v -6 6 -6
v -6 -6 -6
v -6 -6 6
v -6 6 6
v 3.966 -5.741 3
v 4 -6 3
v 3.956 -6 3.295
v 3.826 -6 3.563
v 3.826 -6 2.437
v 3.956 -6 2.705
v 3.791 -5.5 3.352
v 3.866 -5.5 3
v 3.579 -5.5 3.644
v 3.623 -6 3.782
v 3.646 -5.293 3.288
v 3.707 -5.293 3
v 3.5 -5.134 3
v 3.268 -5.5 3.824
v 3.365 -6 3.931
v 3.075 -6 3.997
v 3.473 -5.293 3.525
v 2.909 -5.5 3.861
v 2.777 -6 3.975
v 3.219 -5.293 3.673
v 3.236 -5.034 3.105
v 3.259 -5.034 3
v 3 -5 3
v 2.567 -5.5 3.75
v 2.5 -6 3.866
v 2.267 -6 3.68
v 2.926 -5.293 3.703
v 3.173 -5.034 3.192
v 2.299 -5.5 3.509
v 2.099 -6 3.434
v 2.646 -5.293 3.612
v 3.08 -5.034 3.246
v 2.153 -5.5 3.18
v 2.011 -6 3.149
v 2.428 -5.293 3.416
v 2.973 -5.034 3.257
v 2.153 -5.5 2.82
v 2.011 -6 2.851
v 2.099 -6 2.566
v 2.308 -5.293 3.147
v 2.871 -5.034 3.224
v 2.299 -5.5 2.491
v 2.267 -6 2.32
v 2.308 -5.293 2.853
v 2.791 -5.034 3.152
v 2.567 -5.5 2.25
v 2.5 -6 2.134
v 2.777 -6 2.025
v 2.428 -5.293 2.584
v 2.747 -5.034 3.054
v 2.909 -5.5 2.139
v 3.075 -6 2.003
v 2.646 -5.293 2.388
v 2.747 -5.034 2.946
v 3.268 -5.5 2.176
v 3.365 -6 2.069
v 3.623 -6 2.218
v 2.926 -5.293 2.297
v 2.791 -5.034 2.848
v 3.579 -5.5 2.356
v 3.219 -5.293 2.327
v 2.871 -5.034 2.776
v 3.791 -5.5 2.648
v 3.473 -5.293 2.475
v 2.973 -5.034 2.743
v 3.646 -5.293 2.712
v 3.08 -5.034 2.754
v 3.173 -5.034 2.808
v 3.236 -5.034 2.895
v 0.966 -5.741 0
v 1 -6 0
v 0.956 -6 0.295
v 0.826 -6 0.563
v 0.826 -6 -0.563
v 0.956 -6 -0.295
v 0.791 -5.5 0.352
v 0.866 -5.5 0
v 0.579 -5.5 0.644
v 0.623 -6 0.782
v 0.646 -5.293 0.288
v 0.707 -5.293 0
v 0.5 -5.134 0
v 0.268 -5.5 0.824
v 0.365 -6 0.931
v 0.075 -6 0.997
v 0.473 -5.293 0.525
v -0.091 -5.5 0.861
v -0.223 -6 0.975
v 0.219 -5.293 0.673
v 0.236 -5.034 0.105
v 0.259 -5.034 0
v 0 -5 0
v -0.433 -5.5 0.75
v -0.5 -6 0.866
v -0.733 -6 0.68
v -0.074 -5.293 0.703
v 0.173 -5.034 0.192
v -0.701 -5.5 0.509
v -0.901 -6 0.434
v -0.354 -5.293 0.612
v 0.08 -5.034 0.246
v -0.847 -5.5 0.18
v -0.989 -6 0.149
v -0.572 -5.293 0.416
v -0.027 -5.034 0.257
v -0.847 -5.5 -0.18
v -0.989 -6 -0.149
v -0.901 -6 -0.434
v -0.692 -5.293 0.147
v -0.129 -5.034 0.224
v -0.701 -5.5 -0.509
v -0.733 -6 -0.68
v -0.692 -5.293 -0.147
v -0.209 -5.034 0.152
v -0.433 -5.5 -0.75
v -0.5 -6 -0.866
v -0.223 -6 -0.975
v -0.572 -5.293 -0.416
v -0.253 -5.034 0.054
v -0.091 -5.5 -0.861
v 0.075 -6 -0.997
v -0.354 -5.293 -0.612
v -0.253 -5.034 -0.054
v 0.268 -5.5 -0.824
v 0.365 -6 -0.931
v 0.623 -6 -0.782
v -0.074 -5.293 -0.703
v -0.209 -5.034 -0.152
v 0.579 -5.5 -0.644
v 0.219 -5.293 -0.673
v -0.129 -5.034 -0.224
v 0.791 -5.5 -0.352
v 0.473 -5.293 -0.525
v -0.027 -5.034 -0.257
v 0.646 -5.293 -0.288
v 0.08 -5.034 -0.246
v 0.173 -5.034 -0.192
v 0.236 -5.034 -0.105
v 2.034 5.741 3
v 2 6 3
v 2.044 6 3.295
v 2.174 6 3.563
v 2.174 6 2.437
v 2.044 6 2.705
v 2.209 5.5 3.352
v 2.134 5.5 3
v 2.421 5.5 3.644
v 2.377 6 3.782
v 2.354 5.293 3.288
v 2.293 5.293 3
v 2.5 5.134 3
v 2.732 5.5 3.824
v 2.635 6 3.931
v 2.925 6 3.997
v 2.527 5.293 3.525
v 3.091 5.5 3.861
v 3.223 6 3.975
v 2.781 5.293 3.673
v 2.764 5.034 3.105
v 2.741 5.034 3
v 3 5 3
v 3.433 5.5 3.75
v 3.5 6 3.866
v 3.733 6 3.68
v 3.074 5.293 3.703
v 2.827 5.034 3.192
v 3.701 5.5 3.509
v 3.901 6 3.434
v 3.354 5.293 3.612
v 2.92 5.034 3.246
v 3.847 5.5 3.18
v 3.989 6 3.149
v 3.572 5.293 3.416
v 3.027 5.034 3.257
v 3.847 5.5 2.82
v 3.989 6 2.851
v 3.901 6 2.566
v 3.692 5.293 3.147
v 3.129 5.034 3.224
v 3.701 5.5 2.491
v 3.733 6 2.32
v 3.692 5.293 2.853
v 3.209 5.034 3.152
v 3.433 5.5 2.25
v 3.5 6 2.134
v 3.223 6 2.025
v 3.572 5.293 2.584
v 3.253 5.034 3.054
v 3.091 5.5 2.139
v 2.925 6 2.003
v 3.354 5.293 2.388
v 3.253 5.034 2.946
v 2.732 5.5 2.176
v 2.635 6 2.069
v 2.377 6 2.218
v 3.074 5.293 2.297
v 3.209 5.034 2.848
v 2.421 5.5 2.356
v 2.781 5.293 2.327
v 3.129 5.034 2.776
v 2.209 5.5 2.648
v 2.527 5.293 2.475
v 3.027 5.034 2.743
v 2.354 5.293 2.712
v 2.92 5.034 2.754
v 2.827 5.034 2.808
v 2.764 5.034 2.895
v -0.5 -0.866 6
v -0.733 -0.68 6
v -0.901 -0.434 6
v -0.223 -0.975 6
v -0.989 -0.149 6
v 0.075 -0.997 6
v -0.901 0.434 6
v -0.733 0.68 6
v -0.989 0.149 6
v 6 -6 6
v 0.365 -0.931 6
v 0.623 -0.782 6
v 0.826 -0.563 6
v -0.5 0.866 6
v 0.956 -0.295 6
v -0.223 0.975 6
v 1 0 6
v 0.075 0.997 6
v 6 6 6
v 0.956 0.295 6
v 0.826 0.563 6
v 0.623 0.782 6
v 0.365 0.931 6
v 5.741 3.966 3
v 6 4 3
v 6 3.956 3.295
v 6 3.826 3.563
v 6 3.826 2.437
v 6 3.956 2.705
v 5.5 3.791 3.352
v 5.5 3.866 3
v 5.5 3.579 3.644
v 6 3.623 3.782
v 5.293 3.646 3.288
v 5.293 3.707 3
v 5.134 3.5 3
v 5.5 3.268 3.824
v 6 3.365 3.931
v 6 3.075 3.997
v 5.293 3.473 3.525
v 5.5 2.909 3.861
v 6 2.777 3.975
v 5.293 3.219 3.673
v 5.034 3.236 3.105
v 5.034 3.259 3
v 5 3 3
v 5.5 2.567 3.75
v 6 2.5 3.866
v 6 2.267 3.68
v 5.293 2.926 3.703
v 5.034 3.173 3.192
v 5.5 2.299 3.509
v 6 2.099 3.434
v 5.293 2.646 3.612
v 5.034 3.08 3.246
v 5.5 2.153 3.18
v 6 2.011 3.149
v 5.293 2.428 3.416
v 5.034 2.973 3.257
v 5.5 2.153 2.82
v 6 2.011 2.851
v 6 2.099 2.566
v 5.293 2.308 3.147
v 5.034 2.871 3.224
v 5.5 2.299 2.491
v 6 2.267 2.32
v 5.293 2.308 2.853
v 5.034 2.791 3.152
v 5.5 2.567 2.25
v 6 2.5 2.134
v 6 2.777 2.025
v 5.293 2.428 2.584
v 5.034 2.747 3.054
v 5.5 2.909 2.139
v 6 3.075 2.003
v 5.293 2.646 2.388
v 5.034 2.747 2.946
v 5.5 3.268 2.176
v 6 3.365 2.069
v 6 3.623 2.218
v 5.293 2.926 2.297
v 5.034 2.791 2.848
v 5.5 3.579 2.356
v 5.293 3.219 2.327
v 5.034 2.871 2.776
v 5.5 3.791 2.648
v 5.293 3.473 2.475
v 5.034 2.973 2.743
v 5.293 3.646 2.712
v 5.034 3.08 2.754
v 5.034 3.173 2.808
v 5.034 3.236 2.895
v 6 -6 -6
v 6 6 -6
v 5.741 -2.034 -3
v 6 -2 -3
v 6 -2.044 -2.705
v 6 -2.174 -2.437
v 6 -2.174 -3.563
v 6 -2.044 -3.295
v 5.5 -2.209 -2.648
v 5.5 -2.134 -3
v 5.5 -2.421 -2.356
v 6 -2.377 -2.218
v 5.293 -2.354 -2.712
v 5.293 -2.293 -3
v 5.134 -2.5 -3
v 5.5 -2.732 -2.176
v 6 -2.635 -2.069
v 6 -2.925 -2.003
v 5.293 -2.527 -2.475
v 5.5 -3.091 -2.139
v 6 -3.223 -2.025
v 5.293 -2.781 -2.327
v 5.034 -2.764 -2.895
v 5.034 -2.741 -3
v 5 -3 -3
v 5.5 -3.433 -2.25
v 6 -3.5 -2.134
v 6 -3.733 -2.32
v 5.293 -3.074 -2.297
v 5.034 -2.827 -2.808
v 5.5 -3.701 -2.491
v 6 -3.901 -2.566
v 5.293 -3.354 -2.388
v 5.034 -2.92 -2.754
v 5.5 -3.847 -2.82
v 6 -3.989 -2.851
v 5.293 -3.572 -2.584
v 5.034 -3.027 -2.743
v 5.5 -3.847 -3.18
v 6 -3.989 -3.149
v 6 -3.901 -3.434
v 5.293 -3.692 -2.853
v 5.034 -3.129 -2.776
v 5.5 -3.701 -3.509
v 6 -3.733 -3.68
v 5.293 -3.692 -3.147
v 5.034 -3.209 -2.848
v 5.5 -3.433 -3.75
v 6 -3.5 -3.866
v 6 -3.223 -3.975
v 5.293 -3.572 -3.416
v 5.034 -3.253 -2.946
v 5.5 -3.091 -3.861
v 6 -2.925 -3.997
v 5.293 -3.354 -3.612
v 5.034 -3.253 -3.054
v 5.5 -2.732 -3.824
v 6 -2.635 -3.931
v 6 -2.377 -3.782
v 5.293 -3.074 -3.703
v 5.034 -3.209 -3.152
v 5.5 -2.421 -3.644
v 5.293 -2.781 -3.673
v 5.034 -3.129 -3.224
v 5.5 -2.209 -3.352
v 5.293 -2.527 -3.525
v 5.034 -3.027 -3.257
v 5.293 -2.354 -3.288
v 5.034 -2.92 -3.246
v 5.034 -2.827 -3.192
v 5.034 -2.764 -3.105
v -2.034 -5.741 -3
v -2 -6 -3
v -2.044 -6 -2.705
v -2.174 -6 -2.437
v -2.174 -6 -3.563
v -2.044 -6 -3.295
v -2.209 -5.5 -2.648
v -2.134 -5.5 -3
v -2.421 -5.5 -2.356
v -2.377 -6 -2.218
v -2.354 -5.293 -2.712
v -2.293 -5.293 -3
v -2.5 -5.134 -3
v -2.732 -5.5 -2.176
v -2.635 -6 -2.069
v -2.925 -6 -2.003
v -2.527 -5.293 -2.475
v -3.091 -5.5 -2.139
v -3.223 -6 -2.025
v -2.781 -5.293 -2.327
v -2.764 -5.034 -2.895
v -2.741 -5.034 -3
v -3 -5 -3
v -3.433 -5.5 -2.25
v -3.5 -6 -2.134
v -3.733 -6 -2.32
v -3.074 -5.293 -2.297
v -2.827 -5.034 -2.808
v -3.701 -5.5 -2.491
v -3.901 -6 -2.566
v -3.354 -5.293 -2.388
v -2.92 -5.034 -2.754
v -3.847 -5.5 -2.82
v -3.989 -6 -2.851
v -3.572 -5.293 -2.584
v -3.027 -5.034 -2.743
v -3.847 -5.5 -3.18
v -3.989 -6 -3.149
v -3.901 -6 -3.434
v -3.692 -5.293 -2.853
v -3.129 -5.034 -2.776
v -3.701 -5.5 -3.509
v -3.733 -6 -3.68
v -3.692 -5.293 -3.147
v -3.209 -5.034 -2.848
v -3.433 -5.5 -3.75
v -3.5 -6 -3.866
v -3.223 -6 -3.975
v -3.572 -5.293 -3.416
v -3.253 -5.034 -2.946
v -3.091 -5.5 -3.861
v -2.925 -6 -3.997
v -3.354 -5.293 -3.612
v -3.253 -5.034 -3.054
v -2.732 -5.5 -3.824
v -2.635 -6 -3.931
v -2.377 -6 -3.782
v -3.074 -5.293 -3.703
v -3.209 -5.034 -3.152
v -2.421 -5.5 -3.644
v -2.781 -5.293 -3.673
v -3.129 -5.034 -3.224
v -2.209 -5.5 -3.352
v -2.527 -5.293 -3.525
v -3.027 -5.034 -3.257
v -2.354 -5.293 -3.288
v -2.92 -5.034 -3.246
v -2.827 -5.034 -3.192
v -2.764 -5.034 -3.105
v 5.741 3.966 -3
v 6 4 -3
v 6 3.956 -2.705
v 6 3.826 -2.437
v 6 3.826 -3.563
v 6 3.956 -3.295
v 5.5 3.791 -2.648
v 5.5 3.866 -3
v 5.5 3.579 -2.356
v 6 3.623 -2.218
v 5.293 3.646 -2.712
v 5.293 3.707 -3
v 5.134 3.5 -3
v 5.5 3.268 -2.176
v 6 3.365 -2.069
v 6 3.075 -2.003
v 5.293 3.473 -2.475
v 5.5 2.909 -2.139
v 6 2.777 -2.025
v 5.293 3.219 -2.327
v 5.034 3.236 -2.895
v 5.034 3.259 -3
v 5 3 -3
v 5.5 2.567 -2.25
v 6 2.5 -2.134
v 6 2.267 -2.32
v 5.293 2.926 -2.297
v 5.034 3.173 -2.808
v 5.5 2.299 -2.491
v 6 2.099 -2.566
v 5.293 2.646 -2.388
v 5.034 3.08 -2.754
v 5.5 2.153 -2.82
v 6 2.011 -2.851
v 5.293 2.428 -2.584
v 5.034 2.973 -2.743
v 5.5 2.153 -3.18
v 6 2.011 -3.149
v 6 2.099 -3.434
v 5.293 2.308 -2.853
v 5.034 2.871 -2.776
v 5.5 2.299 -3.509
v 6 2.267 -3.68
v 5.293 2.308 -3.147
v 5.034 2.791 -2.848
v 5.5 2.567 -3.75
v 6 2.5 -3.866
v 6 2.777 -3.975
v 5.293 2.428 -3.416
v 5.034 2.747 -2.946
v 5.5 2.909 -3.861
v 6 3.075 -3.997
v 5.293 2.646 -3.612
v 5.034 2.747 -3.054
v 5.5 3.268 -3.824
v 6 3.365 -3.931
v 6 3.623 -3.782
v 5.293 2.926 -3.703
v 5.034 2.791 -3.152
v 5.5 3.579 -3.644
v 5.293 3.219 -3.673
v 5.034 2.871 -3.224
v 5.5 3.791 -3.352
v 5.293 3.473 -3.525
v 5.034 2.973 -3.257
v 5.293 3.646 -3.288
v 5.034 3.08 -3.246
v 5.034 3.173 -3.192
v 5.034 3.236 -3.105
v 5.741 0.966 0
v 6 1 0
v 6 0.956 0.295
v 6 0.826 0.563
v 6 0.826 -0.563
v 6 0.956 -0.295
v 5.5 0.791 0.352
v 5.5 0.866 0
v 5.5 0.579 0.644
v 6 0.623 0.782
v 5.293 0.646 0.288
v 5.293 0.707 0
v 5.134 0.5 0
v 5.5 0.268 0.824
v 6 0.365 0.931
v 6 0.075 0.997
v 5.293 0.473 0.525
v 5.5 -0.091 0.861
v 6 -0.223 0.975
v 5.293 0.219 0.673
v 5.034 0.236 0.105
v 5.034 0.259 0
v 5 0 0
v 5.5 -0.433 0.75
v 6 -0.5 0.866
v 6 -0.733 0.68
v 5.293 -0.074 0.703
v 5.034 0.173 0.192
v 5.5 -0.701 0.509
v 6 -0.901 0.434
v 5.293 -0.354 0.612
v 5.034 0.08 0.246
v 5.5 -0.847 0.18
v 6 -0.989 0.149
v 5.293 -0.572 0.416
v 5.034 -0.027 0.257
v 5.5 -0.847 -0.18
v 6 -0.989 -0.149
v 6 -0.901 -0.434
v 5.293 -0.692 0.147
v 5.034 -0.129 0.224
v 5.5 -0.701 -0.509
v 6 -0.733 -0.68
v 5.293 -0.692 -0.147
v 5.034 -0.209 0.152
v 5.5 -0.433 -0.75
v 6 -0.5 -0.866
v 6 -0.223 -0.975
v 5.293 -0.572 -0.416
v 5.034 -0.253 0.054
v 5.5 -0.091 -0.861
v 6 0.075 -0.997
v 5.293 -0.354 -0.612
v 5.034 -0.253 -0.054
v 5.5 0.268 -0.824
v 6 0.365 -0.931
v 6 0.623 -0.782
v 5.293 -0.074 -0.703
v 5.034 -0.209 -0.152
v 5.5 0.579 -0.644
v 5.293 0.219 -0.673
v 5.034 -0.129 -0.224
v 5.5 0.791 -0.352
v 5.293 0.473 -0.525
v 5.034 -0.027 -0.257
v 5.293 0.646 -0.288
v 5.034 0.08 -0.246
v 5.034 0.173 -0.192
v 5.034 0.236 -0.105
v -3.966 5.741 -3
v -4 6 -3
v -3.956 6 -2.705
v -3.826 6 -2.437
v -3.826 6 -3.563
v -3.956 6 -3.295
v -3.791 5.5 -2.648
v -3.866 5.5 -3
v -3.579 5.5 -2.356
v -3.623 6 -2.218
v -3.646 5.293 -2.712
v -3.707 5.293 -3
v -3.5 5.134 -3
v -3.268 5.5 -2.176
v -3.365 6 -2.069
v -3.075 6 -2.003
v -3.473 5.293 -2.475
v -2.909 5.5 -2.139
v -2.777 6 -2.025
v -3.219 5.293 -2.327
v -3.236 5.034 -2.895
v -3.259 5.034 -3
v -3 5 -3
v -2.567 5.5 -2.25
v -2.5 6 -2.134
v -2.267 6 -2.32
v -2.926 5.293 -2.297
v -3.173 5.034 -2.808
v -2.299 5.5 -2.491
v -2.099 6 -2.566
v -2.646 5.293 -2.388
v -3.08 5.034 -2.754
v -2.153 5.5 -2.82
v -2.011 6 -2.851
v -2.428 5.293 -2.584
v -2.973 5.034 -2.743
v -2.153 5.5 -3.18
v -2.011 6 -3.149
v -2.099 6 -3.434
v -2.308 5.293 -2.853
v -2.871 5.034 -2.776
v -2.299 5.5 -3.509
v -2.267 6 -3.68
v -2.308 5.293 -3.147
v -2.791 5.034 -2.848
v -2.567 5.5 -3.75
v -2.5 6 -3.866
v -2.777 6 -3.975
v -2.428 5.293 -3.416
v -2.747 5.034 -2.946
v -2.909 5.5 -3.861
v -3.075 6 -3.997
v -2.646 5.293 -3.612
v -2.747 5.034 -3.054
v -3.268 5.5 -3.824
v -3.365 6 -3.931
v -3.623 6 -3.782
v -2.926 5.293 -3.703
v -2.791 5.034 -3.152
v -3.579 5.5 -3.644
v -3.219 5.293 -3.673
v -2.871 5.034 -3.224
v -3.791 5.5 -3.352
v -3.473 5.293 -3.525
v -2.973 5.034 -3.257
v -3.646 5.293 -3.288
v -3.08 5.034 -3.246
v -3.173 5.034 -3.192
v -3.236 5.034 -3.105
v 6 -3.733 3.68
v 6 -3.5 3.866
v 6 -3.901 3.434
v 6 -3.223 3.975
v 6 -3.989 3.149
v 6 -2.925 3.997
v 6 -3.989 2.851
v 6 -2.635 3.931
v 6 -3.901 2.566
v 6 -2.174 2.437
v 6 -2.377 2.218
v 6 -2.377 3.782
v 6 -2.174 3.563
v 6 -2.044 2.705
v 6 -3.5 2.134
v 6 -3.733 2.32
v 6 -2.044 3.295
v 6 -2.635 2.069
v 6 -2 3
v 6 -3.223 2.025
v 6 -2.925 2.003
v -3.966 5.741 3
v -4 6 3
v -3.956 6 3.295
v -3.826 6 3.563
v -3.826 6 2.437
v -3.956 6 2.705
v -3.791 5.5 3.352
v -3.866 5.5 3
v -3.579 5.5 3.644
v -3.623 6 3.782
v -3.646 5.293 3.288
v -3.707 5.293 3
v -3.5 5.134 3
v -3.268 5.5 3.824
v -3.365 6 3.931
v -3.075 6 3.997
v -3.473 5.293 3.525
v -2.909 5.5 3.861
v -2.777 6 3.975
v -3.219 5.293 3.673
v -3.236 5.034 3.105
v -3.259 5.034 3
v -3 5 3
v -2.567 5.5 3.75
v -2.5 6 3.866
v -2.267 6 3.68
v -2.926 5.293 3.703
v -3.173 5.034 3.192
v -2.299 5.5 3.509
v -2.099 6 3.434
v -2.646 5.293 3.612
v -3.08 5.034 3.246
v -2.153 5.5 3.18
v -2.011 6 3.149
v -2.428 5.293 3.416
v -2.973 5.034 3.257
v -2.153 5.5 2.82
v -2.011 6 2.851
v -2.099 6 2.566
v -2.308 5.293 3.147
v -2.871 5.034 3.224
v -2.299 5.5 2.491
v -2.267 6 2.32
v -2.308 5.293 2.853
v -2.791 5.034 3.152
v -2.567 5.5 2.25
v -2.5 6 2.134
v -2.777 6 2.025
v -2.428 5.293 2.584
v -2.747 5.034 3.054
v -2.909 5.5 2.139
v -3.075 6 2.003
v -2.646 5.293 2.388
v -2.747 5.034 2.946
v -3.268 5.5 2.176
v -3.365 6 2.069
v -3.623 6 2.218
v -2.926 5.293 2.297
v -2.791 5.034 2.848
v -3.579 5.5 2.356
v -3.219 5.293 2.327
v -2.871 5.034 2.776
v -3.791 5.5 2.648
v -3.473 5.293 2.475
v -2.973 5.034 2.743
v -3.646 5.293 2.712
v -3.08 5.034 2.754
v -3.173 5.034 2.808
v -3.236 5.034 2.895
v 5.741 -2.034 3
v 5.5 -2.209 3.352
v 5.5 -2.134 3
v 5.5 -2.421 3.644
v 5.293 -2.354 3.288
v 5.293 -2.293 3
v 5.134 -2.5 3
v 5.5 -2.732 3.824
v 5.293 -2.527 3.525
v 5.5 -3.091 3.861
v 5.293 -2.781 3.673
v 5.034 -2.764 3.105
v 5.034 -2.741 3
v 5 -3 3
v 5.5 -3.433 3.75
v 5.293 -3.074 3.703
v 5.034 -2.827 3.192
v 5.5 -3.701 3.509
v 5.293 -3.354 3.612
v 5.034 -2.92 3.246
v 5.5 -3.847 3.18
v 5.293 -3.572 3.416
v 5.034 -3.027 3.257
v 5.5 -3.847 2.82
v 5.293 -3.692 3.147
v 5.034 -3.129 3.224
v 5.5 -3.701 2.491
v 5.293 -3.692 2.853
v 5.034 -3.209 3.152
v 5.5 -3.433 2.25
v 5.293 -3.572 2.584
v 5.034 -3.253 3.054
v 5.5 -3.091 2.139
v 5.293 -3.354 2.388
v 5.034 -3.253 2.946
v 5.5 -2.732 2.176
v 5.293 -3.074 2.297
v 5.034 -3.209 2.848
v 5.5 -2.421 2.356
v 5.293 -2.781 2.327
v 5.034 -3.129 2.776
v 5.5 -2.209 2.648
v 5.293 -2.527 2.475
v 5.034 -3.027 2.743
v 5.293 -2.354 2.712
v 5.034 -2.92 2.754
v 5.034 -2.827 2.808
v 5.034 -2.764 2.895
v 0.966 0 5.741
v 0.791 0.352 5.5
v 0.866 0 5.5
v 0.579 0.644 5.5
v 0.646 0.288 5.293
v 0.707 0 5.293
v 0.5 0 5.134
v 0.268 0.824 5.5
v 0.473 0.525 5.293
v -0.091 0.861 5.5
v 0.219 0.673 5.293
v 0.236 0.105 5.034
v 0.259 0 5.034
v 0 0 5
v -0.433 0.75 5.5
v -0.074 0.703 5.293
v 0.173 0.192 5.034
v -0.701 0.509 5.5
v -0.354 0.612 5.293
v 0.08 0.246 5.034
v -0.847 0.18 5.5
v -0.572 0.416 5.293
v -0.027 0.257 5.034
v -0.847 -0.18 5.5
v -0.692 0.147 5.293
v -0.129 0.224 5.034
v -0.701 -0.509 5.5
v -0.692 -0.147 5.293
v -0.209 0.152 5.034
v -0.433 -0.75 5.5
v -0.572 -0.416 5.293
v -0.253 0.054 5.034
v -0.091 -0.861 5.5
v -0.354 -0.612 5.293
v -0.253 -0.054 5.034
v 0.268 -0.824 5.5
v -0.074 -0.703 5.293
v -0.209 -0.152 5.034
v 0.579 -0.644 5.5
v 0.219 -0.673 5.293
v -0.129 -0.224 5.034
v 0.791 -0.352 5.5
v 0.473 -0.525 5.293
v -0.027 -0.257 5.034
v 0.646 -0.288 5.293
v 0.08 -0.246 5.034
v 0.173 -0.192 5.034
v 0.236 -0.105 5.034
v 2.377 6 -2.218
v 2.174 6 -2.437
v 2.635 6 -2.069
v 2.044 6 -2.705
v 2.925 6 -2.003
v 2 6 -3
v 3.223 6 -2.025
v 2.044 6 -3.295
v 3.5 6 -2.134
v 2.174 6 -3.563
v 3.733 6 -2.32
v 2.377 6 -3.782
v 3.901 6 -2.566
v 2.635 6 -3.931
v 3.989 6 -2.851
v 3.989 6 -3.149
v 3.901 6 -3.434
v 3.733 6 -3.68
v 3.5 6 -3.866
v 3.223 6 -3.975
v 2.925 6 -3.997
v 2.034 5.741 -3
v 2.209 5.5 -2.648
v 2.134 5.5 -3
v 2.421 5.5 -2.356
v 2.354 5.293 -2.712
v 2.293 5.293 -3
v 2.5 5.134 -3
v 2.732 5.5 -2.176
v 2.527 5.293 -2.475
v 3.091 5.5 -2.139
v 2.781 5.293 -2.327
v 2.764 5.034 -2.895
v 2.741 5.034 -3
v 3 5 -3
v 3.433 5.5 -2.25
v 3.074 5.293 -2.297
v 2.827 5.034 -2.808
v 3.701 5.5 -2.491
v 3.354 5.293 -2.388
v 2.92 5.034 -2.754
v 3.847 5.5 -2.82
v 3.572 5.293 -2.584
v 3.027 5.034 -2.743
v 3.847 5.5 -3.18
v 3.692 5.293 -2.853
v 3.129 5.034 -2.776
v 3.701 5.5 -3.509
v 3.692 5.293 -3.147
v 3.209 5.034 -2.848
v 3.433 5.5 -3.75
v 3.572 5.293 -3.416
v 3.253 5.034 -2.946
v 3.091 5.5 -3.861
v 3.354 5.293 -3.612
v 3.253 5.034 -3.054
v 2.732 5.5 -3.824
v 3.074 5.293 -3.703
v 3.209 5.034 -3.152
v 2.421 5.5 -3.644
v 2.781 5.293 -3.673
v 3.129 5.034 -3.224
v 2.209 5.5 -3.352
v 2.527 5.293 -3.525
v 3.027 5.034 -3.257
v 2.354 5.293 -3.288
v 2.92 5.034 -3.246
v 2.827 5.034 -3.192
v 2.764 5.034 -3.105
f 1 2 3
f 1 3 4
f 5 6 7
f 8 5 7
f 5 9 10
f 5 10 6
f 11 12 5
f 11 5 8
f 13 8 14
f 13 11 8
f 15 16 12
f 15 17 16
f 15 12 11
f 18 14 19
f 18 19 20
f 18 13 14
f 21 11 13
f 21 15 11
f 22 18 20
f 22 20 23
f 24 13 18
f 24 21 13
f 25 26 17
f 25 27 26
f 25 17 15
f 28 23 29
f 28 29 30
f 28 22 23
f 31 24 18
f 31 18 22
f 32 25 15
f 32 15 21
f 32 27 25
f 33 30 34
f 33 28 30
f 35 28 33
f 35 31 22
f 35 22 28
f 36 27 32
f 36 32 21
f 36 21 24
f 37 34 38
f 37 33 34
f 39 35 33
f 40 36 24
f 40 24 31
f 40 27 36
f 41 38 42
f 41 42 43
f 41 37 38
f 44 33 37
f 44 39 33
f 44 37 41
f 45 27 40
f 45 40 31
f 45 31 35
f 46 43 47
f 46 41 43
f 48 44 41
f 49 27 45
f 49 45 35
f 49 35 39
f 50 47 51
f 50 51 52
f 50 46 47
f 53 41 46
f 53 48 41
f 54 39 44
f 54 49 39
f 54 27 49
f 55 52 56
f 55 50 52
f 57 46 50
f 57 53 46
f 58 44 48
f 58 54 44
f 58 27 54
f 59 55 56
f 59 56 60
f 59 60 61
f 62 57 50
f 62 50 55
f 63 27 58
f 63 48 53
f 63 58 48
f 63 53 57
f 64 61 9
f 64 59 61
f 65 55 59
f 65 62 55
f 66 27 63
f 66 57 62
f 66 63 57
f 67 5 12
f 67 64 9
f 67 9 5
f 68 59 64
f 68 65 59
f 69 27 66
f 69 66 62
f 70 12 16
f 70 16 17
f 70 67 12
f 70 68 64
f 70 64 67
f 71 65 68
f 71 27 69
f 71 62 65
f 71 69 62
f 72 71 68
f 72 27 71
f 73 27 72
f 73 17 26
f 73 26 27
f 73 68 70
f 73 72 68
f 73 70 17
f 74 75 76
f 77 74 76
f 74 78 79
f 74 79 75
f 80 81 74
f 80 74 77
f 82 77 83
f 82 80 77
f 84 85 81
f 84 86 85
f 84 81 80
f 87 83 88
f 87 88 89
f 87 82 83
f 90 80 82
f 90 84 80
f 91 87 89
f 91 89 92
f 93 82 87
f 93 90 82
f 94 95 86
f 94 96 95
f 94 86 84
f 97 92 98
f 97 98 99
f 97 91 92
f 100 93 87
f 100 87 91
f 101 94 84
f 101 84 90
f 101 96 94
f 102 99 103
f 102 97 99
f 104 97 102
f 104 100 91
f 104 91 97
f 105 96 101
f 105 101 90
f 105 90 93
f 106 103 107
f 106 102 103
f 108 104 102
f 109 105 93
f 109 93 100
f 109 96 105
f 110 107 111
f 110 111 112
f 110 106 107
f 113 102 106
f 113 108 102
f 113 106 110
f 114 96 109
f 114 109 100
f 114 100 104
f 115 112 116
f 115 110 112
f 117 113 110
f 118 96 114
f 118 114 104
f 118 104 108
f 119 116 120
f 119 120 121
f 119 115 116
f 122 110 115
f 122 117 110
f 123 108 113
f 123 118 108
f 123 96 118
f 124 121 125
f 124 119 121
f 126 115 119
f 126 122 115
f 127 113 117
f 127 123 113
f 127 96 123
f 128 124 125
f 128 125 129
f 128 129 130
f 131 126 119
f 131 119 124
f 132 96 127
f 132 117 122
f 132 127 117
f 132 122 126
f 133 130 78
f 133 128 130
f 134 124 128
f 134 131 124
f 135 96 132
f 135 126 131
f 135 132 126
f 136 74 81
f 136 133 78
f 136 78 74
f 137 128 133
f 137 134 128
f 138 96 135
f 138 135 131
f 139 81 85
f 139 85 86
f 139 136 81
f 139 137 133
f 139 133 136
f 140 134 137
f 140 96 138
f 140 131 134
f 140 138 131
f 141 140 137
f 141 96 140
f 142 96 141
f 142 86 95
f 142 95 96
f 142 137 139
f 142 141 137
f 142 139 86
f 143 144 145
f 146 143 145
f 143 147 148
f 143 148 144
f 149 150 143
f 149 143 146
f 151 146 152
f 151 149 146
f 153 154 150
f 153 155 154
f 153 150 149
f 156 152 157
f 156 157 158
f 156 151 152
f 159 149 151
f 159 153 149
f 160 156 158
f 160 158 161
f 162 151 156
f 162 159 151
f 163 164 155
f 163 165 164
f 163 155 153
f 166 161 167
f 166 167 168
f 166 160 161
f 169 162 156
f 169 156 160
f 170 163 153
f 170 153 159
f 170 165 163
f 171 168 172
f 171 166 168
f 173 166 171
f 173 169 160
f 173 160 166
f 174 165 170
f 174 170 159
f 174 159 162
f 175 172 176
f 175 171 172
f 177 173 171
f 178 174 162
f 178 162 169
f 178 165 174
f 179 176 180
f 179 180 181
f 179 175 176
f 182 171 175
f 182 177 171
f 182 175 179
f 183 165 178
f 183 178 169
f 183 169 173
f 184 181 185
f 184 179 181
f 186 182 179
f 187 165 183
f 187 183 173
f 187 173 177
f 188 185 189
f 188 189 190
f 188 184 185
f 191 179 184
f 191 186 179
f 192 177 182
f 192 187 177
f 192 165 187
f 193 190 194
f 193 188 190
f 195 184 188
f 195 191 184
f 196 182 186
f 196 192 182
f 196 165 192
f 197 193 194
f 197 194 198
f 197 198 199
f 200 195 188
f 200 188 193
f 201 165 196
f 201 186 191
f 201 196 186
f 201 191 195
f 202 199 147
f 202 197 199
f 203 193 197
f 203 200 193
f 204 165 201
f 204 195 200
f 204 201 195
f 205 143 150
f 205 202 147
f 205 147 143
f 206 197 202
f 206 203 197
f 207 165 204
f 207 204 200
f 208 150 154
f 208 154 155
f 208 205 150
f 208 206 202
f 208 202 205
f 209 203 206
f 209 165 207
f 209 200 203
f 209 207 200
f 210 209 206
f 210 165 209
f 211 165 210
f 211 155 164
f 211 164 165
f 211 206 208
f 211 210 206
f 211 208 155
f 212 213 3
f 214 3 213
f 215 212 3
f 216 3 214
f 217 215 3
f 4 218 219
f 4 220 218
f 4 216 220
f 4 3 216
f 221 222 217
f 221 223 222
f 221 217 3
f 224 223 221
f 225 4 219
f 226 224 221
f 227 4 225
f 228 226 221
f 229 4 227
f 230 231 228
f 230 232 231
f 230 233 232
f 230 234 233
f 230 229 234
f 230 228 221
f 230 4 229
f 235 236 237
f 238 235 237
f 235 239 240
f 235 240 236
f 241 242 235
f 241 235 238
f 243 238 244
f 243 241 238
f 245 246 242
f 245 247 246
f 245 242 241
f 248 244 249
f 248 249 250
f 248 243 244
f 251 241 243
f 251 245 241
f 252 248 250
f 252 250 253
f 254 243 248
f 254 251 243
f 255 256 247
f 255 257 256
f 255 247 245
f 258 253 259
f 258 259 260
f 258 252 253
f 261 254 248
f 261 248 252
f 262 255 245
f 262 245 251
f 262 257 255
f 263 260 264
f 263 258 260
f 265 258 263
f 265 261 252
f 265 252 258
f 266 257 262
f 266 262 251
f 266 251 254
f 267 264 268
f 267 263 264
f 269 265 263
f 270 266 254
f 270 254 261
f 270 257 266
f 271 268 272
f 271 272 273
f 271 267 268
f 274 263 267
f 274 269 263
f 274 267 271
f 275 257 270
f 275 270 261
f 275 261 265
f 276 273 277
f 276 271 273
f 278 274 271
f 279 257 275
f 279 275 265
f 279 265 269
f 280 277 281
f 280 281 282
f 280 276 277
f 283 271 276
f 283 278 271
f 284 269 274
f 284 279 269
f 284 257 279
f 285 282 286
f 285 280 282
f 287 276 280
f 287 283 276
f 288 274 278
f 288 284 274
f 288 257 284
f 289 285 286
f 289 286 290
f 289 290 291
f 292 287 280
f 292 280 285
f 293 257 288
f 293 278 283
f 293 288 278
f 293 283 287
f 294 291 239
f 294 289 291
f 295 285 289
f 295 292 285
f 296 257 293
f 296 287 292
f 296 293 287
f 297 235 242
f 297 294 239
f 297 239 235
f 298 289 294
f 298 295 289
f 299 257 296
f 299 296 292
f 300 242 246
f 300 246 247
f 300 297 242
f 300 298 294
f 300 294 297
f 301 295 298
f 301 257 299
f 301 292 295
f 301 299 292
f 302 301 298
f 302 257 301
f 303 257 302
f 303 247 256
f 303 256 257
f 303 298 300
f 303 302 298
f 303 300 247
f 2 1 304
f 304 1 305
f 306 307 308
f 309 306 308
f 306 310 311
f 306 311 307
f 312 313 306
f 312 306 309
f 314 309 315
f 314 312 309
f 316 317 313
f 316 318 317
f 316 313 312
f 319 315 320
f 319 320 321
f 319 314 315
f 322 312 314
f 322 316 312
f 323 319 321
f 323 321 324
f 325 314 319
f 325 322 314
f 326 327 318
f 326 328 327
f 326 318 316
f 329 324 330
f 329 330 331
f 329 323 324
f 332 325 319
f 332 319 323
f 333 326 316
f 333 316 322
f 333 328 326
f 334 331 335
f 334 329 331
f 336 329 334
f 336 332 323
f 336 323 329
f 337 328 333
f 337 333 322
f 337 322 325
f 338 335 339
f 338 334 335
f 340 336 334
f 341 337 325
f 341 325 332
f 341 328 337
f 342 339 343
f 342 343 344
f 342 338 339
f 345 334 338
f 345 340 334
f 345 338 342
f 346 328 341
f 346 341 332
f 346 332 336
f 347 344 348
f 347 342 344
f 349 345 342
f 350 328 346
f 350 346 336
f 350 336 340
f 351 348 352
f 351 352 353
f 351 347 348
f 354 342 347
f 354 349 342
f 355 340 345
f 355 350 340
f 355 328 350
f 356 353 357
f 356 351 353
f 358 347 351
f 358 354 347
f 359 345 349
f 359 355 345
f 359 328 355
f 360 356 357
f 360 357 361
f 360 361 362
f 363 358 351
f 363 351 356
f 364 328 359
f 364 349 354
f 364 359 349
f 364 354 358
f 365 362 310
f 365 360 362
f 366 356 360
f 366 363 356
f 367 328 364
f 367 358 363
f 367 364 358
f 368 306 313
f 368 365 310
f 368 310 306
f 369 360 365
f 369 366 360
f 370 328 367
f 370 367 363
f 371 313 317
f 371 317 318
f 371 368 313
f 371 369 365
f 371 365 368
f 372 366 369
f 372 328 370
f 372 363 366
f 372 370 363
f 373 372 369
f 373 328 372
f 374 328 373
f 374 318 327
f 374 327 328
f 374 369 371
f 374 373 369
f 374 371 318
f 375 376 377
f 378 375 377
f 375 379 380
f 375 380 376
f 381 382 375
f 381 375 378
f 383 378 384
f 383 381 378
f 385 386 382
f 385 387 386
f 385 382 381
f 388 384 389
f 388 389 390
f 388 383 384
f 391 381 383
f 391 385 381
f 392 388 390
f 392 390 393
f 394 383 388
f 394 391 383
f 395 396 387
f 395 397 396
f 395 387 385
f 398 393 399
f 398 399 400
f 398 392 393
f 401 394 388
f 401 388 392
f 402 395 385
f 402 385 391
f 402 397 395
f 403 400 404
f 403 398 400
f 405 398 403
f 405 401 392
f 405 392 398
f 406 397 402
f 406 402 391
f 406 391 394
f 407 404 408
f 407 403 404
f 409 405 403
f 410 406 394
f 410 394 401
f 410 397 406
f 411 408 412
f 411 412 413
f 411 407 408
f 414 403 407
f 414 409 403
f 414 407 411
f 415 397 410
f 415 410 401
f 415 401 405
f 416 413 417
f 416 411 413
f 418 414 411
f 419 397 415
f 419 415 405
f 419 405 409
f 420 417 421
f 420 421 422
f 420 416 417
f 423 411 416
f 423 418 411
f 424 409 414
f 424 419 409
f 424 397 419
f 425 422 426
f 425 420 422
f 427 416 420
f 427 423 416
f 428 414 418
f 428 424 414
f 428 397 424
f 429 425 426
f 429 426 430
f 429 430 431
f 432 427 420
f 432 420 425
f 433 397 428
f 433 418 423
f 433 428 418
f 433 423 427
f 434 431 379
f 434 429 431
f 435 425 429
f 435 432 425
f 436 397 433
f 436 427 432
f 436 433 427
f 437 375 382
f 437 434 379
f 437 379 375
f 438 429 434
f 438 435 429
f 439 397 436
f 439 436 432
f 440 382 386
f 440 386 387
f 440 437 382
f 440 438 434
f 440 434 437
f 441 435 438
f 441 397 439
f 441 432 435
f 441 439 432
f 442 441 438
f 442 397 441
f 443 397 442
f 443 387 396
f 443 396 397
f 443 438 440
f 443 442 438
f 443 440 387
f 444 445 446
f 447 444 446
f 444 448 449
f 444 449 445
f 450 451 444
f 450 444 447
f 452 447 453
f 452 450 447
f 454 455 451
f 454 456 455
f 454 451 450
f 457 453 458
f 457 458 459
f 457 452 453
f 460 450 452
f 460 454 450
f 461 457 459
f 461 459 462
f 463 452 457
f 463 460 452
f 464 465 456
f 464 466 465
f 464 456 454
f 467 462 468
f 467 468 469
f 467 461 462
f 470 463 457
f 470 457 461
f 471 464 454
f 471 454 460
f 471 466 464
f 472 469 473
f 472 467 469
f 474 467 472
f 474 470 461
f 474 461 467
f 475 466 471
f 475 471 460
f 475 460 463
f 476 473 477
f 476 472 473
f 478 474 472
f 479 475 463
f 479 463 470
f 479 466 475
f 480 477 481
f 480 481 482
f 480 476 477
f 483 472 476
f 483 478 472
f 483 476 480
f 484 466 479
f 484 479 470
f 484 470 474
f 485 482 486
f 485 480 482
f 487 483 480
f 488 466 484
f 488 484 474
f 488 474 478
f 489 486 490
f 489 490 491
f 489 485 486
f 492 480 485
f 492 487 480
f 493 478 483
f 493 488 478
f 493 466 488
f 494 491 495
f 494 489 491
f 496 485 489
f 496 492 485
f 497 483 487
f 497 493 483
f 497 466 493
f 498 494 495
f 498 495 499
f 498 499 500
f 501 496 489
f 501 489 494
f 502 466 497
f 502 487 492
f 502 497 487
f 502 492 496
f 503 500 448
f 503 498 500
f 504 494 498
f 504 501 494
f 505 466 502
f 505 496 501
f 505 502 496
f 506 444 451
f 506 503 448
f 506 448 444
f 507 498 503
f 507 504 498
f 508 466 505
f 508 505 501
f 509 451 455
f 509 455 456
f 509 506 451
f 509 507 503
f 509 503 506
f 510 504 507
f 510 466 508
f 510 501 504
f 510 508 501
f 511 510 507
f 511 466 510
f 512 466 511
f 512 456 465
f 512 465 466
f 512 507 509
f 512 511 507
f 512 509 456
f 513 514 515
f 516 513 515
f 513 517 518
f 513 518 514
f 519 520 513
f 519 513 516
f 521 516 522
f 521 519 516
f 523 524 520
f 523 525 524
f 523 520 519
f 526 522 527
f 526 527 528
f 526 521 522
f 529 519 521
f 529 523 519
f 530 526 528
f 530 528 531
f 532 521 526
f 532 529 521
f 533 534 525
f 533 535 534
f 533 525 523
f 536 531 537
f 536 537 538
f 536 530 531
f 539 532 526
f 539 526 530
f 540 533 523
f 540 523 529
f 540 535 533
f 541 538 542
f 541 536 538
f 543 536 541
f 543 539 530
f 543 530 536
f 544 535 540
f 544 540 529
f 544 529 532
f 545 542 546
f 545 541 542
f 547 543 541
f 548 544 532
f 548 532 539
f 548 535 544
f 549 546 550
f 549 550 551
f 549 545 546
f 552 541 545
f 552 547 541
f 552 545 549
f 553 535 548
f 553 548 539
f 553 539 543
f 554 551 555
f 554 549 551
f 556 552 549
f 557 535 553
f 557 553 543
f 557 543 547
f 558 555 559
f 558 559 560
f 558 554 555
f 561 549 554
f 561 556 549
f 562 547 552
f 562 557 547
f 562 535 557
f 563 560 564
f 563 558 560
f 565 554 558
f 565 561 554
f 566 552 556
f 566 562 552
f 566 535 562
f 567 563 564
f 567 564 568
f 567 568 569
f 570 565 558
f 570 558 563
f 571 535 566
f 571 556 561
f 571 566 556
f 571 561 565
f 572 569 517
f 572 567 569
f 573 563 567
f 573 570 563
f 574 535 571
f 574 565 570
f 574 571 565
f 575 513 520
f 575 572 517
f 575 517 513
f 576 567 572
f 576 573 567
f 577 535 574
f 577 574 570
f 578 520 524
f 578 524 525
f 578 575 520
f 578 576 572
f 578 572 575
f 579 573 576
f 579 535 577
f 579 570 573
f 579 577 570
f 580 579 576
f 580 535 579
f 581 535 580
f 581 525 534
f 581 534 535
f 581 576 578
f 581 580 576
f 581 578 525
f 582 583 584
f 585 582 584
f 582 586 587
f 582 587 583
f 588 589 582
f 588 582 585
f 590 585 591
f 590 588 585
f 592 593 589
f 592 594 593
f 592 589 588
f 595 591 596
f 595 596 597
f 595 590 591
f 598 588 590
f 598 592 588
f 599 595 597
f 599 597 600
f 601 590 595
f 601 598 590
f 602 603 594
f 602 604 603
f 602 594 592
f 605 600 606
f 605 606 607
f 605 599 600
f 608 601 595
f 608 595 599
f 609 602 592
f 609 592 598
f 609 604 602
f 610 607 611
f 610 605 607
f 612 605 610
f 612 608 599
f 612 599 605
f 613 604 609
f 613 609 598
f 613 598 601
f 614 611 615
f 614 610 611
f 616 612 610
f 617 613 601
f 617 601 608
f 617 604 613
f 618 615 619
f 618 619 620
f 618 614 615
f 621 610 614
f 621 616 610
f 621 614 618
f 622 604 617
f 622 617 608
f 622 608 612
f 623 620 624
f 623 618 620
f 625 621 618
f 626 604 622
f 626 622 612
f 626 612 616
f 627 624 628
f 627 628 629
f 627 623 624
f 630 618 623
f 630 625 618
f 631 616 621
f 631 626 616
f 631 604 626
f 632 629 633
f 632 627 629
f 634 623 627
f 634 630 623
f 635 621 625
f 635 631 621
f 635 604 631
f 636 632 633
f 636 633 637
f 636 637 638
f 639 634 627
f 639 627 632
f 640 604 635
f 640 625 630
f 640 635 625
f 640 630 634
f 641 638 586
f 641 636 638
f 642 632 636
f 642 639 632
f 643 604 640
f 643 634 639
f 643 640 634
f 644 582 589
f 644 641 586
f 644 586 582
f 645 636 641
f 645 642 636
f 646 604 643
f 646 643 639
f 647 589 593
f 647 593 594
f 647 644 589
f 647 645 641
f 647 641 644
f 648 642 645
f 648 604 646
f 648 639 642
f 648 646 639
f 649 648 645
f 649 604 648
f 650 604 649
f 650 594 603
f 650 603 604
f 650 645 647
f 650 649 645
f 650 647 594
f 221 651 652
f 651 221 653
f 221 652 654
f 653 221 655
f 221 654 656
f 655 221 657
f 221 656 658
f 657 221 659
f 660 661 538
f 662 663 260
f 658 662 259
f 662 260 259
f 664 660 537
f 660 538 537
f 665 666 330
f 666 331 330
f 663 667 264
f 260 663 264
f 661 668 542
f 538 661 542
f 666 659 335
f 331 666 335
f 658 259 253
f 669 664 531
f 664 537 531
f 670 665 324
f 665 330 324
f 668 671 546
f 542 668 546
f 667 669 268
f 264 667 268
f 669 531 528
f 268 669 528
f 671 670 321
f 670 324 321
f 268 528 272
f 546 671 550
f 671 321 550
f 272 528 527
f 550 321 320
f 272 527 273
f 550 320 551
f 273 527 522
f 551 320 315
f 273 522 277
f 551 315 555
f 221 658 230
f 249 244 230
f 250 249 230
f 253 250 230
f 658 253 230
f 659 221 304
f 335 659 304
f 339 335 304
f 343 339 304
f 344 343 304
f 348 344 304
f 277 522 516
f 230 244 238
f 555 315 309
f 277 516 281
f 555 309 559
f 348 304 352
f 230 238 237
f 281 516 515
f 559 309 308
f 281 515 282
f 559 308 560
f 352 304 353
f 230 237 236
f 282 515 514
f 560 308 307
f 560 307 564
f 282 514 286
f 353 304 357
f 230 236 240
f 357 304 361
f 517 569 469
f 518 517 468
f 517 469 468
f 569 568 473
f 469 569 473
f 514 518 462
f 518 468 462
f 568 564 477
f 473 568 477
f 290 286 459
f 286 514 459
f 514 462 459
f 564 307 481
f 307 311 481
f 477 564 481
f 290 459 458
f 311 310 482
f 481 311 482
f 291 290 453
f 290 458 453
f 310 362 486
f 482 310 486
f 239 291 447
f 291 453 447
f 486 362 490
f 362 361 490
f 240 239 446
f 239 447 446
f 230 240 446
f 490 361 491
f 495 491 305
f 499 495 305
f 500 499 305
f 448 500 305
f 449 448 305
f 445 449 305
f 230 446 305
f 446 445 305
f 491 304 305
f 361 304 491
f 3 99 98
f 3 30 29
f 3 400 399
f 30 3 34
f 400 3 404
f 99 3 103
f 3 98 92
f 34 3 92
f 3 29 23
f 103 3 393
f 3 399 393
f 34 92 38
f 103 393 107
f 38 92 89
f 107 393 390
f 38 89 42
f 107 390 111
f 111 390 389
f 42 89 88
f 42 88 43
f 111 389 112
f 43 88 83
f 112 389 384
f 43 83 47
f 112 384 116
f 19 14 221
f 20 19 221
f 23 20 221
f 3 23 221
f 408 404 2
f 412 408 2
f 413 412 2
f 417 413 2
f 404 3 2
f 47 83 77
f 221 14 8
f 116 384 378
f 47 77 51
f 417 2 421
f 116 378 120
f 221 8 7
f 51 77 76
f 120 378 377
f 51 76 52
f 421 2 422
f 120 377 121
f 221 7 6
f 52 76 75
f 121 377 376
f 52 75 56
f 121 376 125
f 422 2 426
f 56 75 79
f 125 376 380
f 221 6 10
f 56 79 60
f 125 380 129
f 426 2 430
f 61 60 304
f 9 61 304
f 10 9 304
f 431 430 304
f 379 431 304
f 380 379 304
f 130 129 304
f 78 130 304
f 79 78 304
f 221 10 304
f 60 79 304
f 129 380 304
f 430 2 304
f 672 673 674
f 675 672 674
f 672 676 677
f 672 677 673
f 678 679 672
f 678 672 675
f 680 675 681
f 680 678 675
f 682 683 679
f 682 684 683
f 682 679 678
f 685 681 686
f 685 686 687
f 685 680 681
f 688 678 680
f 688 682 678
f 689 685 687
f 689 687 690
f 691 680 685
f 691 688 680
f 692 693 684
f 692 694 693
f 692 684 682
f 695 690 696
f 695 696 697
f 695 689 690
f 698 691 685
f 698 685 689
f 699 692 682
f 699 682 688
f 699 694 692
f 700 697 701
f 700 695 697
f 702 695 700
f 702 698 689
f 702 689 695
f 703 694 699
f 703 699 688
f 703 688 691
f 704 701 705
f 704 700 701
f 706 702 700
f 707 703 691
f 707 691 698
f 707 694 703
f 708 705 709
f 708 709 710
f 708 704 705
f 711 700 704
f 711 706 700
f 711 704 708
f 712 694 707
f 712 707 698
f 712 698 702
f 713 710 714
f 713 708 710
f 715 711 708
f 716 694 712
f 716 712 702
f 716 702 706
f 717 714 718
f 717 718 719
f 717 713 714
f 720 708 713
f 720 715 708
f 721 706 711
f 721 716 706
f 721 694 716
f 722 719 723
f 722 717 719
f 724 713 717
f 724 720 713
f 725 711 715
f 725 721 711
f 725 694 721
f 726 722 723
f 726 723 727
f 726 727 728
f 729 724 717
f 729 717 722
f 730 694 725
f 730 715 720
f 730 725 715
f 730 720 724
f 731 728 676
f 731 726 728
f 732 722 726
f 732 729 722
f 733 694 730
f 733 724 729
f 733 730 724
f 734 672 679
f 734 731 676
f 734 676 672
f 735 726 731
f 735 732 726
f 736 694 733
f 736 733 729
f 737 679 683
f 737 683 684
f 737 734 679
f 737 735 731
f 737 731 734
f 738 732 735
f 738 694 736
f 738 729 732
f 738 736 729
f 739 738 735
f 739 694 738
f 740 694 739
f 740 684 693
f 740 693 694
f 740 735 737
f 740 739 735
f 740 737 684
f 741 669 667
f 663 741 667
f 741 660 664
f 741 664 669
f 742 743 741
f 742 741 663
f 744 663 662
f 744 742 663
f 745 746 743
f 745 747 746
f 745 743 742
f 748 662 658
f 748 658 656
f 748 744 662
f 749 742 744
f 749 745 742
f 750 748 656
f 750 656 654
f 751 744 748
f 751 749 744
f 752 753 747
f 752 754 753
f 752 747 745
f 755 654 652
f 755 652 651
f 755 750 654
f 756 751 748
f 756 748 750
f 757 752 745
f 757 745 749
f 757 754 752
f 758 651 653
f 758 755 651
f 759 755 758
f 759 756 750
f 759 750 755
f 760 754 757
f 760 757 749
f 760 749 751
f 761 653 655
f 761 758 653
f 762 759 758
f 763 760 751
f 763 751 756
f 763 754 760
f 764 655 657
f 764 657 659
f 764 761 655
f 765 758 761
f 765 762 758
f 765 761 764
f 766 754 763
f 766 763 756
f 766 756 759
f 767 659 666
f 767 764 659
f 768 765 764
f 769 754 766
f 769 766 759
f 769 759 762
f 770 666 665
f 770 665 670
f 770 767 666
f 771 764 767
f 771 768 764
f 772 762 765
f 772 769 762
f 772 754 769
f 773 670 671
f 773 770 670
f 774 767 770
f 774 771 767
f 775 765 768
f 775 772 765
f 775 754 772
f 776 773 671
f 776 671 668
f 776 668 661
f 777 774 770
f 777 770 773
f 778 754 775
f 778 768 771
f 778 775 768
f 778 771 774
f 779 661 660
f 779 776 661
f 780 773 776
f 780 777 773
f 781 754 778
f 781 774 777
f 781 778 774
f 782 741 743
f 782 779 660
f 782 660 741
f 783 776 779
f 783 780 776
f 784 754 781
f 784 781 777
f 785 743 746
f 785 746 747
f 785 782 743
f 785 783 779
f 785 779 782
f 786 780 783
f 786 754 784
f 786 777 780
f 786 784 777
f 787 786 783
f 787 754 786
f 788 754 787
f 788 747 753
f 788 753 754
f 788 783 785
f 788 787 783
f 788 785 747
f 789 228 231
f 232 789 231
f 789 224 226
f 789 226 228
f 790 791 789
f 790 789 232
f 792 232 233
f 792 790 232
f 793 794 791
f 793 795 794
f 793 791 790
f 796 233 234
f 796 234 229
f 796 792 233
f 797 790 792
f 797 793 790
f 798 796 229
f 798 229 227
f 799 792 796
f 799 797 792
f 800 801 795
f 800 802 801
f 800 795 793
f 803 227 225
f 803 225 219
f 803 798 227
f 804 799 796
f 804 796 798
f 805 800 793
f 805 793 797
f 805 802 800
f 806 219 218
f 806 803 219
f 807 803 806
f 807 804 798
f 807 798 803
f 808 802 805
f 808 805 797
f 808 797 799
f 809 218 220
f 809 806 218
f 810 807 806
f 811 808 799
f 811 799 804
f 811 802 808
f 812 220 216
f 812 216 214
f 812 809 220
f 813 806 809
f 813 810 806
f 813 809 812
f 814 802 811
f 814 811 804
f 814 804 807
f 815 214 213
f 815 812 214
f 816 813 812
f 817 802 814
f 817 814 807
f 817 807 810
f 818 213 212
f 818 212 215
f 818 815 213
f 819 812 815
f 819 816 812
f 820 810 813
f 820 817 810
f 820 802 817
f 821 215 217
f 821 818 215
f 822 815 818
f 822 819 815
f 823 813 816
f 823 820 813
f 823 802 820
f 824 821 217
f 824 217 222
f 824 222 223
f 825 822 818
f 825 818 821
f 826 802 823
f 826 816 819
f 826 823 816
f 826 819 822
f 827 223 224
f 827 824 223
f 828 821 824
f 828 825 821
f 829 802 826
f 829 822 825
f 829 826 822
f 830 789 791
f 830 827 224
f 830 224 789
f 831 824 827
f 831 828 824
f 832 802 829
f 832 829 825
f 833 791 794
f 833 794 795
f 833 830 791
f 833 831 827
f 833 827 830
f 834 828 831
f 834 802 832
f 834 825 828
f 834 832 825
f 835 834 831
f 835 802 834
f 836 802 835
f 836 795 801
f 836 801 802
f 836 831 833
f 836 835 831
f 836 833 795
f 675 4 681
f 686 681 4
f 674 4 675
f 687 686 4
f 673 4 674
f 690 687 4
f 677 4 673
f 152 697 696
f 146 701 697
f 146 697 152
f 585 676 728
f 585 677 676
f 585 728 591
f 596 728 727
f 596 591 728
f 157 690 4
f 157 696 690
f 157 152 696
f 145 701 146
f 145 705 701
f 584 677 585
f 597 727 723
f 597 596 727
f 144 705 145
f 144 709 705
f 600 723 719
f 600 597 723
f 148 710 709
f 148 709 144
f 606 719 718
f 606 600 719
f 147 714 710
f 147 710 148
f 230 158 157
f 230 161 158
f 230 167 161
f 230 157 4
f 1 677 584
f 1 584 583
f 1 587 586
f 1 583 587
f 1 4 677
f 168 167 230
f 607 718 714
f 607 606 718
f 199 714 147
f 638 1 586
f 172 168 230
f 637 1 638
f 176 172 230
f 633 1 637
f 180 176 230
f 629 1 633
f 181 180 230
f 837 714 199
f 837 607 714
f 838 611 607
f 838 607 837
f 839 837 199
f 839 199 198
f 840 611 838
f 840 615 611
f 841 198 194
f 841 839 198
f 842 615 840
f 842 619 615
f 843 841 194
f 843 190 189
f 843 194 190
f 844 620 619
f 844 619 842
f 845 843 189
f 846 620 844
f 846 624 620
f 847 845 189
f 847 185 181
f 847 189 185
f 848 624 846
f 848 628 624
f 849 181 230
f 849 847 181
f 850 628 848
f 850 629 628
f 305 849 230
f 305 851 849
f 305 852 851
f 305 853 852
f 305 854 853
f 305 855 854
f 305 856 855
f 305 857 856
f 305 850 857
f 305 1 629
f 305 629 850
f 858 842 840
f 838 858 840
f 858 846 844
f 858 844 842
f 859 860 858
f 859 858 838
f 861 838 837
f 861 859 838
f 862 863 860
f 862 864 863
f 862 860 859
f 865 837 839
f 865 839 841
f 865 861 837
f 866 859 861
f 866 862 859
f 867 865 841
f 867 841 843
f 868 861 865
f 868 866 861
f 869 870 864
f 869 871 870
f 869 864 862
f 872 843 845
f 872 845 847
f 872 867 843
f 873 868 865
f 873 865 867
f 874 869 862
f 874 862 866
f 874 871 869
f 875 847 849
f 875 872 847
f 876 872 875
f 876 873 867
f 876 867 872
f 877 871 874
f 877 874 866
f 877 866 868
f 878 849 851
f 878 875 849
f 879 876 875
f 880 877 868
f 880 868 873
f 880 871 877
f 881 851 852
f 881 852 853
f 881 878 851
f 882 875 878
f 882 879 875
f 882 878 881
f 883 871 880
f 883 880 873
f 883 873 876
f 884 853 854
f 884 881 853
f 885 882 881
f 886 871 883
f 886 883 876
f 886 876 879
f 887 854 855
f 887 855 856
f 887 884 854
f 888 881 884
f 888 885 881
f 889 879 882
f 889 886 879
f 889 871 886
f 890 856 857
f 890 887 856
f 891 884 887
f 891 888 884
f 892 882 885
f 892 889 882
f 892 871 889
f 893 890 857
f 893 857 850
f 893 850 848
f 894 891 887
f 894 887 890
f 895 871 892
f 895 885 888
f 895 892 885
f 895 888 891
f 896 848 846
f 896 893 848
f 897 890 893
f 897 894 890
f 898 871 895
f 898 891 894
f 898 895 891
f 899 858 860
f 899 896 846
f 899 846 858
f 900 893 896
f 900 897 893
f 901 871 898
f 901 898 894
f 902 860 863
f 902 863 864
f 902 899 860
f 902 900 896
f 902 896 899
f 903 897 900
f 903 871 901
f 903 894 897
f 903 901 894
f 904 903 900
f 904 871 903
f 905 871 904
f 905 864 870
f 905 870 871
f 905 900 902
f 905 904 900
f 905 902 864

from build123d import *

# Parameters (mm, degrees)
F1_W      = 12
F1_H      = 12
F2_DEPTH  = 12
F3_R      = 1
F4_DEPTH  = 1
F5_R      = 0.99999
F6_R      = 1
F7_DEPTH  = 1
F8_R      = 0.99999
F9_R      = 1
F10_DEPTH = 1
F11_R     = 0.99999
F12_R     = 1
F13_DEPTH = 1
F14_R     = 0.99999


# Not quite as in the source:
# - a fillet or chamfer is up to 0.001 mm smaller than in the source, because OpenCascade refuses the exact size


with BuildPart() as f2:
    # F1 (on offset) → F2 (new body)
    with BuildSketch(Plane.XY.offset(-6)):
        Rectangle(F1_W, F1_H)
    extrude(amount=F2_DEPTH)

    # F3 (on face) → F4 (cut)
    with BuildSketch(Plane.XY.offset(6)):
        Circle(F3_R)
    extrude(amount=-F4_DEPTH, mode=Mode.SUBTRACT)

    # F5 (radius 1 in the source; OpenCascade refuses exactly that, so slightly less here)
    f5_edges = [f2.edges().sort_by_distance(p)[0] for p in [
        (-1, 0, 5),
    ]]
    fillet(f5_edges, radius=F5_R)

    # F6 (on face) → F7 (cut)
    with BuildSketch(Plane.XZ.offset(6)):
        with Locations((3, 3)):
            Circle(F6_R)
        Circle(F6_R)
        with Locations((-3, -3)):
            Circle(F6_R)
    extrude(amount=-F7_DEPTH, mode=Mode.SUBTRACT)

    # F8 (radius 1 in the source; OpenCascade refuses exactly that, so slightly less here)
    f8_edges = [f2.edges().sort_by_distance(p)[0] for p in [
        (2, -5, 3),
        (-1, -5, 0),
        (-4, -5, -3),
    ]]
    fillet(f8_edges, radius=F8_R)

    # F9 (on face) → F10 (cut)
    with BuildSketch(Plane.YZ.offset(6)):
        with Locations((-3, 3)):
            Circle(F9_R)
        Circle(F9_R)
        with Locations((3, 3)):
            Circle(F9_R)
        with Locations((3, -3)):
            Circle(F9_R)
        with Locations((-3, -3)):
            Circle(F9_R)
    extrude(amount=-F10_DEPTH, mode=Mode.SUBTRACT)

    # F11 (radius 1 in the source; OpenCascade refuses exactly that, so slightly less here)
    f11_edges = [f2.edges().sort_by_distance(p)[0] for p in [
        (5, -4, 3),
        (5, -1, 0),
        (5, 2, 3),
        (5, 2, -3),
        (5, -4, -3),
    ]]
    fillet(f11_edges, radius=F11_R)

    # F12 (on face) → F13 (cut)
    with BuildSketch(Plane(origin=(0, 6, 0), x_dir=(-1, 0, 0), z_dir=(0, 1, 0))):
        with Locations((-3, 3)):
            Circle(F12_R)
        with Locations((3, 3)):
            Circle(F12_R)
        with Locations((3, -3)):
            Circle(F12_R)
        with Locations((-3, -3)):
            Circle(F12_R)
    extrude(amount=-F13_DEPTH, mode=Mode.SUBTRACT)

    # F14 (radius 1 in the source; OpenCascade refuses exactly that, so slightly less here)
    f14_edges = [f2.edges().sort_by_distance(p)[0] for p in [
        (4, 5, 3),
        (-2, 5, 3),
        (4, 5, -3),
        (-2, 5, -3),
    ]]
    fillet(f14_edges, radius=F14_R)


solid = f2.part
